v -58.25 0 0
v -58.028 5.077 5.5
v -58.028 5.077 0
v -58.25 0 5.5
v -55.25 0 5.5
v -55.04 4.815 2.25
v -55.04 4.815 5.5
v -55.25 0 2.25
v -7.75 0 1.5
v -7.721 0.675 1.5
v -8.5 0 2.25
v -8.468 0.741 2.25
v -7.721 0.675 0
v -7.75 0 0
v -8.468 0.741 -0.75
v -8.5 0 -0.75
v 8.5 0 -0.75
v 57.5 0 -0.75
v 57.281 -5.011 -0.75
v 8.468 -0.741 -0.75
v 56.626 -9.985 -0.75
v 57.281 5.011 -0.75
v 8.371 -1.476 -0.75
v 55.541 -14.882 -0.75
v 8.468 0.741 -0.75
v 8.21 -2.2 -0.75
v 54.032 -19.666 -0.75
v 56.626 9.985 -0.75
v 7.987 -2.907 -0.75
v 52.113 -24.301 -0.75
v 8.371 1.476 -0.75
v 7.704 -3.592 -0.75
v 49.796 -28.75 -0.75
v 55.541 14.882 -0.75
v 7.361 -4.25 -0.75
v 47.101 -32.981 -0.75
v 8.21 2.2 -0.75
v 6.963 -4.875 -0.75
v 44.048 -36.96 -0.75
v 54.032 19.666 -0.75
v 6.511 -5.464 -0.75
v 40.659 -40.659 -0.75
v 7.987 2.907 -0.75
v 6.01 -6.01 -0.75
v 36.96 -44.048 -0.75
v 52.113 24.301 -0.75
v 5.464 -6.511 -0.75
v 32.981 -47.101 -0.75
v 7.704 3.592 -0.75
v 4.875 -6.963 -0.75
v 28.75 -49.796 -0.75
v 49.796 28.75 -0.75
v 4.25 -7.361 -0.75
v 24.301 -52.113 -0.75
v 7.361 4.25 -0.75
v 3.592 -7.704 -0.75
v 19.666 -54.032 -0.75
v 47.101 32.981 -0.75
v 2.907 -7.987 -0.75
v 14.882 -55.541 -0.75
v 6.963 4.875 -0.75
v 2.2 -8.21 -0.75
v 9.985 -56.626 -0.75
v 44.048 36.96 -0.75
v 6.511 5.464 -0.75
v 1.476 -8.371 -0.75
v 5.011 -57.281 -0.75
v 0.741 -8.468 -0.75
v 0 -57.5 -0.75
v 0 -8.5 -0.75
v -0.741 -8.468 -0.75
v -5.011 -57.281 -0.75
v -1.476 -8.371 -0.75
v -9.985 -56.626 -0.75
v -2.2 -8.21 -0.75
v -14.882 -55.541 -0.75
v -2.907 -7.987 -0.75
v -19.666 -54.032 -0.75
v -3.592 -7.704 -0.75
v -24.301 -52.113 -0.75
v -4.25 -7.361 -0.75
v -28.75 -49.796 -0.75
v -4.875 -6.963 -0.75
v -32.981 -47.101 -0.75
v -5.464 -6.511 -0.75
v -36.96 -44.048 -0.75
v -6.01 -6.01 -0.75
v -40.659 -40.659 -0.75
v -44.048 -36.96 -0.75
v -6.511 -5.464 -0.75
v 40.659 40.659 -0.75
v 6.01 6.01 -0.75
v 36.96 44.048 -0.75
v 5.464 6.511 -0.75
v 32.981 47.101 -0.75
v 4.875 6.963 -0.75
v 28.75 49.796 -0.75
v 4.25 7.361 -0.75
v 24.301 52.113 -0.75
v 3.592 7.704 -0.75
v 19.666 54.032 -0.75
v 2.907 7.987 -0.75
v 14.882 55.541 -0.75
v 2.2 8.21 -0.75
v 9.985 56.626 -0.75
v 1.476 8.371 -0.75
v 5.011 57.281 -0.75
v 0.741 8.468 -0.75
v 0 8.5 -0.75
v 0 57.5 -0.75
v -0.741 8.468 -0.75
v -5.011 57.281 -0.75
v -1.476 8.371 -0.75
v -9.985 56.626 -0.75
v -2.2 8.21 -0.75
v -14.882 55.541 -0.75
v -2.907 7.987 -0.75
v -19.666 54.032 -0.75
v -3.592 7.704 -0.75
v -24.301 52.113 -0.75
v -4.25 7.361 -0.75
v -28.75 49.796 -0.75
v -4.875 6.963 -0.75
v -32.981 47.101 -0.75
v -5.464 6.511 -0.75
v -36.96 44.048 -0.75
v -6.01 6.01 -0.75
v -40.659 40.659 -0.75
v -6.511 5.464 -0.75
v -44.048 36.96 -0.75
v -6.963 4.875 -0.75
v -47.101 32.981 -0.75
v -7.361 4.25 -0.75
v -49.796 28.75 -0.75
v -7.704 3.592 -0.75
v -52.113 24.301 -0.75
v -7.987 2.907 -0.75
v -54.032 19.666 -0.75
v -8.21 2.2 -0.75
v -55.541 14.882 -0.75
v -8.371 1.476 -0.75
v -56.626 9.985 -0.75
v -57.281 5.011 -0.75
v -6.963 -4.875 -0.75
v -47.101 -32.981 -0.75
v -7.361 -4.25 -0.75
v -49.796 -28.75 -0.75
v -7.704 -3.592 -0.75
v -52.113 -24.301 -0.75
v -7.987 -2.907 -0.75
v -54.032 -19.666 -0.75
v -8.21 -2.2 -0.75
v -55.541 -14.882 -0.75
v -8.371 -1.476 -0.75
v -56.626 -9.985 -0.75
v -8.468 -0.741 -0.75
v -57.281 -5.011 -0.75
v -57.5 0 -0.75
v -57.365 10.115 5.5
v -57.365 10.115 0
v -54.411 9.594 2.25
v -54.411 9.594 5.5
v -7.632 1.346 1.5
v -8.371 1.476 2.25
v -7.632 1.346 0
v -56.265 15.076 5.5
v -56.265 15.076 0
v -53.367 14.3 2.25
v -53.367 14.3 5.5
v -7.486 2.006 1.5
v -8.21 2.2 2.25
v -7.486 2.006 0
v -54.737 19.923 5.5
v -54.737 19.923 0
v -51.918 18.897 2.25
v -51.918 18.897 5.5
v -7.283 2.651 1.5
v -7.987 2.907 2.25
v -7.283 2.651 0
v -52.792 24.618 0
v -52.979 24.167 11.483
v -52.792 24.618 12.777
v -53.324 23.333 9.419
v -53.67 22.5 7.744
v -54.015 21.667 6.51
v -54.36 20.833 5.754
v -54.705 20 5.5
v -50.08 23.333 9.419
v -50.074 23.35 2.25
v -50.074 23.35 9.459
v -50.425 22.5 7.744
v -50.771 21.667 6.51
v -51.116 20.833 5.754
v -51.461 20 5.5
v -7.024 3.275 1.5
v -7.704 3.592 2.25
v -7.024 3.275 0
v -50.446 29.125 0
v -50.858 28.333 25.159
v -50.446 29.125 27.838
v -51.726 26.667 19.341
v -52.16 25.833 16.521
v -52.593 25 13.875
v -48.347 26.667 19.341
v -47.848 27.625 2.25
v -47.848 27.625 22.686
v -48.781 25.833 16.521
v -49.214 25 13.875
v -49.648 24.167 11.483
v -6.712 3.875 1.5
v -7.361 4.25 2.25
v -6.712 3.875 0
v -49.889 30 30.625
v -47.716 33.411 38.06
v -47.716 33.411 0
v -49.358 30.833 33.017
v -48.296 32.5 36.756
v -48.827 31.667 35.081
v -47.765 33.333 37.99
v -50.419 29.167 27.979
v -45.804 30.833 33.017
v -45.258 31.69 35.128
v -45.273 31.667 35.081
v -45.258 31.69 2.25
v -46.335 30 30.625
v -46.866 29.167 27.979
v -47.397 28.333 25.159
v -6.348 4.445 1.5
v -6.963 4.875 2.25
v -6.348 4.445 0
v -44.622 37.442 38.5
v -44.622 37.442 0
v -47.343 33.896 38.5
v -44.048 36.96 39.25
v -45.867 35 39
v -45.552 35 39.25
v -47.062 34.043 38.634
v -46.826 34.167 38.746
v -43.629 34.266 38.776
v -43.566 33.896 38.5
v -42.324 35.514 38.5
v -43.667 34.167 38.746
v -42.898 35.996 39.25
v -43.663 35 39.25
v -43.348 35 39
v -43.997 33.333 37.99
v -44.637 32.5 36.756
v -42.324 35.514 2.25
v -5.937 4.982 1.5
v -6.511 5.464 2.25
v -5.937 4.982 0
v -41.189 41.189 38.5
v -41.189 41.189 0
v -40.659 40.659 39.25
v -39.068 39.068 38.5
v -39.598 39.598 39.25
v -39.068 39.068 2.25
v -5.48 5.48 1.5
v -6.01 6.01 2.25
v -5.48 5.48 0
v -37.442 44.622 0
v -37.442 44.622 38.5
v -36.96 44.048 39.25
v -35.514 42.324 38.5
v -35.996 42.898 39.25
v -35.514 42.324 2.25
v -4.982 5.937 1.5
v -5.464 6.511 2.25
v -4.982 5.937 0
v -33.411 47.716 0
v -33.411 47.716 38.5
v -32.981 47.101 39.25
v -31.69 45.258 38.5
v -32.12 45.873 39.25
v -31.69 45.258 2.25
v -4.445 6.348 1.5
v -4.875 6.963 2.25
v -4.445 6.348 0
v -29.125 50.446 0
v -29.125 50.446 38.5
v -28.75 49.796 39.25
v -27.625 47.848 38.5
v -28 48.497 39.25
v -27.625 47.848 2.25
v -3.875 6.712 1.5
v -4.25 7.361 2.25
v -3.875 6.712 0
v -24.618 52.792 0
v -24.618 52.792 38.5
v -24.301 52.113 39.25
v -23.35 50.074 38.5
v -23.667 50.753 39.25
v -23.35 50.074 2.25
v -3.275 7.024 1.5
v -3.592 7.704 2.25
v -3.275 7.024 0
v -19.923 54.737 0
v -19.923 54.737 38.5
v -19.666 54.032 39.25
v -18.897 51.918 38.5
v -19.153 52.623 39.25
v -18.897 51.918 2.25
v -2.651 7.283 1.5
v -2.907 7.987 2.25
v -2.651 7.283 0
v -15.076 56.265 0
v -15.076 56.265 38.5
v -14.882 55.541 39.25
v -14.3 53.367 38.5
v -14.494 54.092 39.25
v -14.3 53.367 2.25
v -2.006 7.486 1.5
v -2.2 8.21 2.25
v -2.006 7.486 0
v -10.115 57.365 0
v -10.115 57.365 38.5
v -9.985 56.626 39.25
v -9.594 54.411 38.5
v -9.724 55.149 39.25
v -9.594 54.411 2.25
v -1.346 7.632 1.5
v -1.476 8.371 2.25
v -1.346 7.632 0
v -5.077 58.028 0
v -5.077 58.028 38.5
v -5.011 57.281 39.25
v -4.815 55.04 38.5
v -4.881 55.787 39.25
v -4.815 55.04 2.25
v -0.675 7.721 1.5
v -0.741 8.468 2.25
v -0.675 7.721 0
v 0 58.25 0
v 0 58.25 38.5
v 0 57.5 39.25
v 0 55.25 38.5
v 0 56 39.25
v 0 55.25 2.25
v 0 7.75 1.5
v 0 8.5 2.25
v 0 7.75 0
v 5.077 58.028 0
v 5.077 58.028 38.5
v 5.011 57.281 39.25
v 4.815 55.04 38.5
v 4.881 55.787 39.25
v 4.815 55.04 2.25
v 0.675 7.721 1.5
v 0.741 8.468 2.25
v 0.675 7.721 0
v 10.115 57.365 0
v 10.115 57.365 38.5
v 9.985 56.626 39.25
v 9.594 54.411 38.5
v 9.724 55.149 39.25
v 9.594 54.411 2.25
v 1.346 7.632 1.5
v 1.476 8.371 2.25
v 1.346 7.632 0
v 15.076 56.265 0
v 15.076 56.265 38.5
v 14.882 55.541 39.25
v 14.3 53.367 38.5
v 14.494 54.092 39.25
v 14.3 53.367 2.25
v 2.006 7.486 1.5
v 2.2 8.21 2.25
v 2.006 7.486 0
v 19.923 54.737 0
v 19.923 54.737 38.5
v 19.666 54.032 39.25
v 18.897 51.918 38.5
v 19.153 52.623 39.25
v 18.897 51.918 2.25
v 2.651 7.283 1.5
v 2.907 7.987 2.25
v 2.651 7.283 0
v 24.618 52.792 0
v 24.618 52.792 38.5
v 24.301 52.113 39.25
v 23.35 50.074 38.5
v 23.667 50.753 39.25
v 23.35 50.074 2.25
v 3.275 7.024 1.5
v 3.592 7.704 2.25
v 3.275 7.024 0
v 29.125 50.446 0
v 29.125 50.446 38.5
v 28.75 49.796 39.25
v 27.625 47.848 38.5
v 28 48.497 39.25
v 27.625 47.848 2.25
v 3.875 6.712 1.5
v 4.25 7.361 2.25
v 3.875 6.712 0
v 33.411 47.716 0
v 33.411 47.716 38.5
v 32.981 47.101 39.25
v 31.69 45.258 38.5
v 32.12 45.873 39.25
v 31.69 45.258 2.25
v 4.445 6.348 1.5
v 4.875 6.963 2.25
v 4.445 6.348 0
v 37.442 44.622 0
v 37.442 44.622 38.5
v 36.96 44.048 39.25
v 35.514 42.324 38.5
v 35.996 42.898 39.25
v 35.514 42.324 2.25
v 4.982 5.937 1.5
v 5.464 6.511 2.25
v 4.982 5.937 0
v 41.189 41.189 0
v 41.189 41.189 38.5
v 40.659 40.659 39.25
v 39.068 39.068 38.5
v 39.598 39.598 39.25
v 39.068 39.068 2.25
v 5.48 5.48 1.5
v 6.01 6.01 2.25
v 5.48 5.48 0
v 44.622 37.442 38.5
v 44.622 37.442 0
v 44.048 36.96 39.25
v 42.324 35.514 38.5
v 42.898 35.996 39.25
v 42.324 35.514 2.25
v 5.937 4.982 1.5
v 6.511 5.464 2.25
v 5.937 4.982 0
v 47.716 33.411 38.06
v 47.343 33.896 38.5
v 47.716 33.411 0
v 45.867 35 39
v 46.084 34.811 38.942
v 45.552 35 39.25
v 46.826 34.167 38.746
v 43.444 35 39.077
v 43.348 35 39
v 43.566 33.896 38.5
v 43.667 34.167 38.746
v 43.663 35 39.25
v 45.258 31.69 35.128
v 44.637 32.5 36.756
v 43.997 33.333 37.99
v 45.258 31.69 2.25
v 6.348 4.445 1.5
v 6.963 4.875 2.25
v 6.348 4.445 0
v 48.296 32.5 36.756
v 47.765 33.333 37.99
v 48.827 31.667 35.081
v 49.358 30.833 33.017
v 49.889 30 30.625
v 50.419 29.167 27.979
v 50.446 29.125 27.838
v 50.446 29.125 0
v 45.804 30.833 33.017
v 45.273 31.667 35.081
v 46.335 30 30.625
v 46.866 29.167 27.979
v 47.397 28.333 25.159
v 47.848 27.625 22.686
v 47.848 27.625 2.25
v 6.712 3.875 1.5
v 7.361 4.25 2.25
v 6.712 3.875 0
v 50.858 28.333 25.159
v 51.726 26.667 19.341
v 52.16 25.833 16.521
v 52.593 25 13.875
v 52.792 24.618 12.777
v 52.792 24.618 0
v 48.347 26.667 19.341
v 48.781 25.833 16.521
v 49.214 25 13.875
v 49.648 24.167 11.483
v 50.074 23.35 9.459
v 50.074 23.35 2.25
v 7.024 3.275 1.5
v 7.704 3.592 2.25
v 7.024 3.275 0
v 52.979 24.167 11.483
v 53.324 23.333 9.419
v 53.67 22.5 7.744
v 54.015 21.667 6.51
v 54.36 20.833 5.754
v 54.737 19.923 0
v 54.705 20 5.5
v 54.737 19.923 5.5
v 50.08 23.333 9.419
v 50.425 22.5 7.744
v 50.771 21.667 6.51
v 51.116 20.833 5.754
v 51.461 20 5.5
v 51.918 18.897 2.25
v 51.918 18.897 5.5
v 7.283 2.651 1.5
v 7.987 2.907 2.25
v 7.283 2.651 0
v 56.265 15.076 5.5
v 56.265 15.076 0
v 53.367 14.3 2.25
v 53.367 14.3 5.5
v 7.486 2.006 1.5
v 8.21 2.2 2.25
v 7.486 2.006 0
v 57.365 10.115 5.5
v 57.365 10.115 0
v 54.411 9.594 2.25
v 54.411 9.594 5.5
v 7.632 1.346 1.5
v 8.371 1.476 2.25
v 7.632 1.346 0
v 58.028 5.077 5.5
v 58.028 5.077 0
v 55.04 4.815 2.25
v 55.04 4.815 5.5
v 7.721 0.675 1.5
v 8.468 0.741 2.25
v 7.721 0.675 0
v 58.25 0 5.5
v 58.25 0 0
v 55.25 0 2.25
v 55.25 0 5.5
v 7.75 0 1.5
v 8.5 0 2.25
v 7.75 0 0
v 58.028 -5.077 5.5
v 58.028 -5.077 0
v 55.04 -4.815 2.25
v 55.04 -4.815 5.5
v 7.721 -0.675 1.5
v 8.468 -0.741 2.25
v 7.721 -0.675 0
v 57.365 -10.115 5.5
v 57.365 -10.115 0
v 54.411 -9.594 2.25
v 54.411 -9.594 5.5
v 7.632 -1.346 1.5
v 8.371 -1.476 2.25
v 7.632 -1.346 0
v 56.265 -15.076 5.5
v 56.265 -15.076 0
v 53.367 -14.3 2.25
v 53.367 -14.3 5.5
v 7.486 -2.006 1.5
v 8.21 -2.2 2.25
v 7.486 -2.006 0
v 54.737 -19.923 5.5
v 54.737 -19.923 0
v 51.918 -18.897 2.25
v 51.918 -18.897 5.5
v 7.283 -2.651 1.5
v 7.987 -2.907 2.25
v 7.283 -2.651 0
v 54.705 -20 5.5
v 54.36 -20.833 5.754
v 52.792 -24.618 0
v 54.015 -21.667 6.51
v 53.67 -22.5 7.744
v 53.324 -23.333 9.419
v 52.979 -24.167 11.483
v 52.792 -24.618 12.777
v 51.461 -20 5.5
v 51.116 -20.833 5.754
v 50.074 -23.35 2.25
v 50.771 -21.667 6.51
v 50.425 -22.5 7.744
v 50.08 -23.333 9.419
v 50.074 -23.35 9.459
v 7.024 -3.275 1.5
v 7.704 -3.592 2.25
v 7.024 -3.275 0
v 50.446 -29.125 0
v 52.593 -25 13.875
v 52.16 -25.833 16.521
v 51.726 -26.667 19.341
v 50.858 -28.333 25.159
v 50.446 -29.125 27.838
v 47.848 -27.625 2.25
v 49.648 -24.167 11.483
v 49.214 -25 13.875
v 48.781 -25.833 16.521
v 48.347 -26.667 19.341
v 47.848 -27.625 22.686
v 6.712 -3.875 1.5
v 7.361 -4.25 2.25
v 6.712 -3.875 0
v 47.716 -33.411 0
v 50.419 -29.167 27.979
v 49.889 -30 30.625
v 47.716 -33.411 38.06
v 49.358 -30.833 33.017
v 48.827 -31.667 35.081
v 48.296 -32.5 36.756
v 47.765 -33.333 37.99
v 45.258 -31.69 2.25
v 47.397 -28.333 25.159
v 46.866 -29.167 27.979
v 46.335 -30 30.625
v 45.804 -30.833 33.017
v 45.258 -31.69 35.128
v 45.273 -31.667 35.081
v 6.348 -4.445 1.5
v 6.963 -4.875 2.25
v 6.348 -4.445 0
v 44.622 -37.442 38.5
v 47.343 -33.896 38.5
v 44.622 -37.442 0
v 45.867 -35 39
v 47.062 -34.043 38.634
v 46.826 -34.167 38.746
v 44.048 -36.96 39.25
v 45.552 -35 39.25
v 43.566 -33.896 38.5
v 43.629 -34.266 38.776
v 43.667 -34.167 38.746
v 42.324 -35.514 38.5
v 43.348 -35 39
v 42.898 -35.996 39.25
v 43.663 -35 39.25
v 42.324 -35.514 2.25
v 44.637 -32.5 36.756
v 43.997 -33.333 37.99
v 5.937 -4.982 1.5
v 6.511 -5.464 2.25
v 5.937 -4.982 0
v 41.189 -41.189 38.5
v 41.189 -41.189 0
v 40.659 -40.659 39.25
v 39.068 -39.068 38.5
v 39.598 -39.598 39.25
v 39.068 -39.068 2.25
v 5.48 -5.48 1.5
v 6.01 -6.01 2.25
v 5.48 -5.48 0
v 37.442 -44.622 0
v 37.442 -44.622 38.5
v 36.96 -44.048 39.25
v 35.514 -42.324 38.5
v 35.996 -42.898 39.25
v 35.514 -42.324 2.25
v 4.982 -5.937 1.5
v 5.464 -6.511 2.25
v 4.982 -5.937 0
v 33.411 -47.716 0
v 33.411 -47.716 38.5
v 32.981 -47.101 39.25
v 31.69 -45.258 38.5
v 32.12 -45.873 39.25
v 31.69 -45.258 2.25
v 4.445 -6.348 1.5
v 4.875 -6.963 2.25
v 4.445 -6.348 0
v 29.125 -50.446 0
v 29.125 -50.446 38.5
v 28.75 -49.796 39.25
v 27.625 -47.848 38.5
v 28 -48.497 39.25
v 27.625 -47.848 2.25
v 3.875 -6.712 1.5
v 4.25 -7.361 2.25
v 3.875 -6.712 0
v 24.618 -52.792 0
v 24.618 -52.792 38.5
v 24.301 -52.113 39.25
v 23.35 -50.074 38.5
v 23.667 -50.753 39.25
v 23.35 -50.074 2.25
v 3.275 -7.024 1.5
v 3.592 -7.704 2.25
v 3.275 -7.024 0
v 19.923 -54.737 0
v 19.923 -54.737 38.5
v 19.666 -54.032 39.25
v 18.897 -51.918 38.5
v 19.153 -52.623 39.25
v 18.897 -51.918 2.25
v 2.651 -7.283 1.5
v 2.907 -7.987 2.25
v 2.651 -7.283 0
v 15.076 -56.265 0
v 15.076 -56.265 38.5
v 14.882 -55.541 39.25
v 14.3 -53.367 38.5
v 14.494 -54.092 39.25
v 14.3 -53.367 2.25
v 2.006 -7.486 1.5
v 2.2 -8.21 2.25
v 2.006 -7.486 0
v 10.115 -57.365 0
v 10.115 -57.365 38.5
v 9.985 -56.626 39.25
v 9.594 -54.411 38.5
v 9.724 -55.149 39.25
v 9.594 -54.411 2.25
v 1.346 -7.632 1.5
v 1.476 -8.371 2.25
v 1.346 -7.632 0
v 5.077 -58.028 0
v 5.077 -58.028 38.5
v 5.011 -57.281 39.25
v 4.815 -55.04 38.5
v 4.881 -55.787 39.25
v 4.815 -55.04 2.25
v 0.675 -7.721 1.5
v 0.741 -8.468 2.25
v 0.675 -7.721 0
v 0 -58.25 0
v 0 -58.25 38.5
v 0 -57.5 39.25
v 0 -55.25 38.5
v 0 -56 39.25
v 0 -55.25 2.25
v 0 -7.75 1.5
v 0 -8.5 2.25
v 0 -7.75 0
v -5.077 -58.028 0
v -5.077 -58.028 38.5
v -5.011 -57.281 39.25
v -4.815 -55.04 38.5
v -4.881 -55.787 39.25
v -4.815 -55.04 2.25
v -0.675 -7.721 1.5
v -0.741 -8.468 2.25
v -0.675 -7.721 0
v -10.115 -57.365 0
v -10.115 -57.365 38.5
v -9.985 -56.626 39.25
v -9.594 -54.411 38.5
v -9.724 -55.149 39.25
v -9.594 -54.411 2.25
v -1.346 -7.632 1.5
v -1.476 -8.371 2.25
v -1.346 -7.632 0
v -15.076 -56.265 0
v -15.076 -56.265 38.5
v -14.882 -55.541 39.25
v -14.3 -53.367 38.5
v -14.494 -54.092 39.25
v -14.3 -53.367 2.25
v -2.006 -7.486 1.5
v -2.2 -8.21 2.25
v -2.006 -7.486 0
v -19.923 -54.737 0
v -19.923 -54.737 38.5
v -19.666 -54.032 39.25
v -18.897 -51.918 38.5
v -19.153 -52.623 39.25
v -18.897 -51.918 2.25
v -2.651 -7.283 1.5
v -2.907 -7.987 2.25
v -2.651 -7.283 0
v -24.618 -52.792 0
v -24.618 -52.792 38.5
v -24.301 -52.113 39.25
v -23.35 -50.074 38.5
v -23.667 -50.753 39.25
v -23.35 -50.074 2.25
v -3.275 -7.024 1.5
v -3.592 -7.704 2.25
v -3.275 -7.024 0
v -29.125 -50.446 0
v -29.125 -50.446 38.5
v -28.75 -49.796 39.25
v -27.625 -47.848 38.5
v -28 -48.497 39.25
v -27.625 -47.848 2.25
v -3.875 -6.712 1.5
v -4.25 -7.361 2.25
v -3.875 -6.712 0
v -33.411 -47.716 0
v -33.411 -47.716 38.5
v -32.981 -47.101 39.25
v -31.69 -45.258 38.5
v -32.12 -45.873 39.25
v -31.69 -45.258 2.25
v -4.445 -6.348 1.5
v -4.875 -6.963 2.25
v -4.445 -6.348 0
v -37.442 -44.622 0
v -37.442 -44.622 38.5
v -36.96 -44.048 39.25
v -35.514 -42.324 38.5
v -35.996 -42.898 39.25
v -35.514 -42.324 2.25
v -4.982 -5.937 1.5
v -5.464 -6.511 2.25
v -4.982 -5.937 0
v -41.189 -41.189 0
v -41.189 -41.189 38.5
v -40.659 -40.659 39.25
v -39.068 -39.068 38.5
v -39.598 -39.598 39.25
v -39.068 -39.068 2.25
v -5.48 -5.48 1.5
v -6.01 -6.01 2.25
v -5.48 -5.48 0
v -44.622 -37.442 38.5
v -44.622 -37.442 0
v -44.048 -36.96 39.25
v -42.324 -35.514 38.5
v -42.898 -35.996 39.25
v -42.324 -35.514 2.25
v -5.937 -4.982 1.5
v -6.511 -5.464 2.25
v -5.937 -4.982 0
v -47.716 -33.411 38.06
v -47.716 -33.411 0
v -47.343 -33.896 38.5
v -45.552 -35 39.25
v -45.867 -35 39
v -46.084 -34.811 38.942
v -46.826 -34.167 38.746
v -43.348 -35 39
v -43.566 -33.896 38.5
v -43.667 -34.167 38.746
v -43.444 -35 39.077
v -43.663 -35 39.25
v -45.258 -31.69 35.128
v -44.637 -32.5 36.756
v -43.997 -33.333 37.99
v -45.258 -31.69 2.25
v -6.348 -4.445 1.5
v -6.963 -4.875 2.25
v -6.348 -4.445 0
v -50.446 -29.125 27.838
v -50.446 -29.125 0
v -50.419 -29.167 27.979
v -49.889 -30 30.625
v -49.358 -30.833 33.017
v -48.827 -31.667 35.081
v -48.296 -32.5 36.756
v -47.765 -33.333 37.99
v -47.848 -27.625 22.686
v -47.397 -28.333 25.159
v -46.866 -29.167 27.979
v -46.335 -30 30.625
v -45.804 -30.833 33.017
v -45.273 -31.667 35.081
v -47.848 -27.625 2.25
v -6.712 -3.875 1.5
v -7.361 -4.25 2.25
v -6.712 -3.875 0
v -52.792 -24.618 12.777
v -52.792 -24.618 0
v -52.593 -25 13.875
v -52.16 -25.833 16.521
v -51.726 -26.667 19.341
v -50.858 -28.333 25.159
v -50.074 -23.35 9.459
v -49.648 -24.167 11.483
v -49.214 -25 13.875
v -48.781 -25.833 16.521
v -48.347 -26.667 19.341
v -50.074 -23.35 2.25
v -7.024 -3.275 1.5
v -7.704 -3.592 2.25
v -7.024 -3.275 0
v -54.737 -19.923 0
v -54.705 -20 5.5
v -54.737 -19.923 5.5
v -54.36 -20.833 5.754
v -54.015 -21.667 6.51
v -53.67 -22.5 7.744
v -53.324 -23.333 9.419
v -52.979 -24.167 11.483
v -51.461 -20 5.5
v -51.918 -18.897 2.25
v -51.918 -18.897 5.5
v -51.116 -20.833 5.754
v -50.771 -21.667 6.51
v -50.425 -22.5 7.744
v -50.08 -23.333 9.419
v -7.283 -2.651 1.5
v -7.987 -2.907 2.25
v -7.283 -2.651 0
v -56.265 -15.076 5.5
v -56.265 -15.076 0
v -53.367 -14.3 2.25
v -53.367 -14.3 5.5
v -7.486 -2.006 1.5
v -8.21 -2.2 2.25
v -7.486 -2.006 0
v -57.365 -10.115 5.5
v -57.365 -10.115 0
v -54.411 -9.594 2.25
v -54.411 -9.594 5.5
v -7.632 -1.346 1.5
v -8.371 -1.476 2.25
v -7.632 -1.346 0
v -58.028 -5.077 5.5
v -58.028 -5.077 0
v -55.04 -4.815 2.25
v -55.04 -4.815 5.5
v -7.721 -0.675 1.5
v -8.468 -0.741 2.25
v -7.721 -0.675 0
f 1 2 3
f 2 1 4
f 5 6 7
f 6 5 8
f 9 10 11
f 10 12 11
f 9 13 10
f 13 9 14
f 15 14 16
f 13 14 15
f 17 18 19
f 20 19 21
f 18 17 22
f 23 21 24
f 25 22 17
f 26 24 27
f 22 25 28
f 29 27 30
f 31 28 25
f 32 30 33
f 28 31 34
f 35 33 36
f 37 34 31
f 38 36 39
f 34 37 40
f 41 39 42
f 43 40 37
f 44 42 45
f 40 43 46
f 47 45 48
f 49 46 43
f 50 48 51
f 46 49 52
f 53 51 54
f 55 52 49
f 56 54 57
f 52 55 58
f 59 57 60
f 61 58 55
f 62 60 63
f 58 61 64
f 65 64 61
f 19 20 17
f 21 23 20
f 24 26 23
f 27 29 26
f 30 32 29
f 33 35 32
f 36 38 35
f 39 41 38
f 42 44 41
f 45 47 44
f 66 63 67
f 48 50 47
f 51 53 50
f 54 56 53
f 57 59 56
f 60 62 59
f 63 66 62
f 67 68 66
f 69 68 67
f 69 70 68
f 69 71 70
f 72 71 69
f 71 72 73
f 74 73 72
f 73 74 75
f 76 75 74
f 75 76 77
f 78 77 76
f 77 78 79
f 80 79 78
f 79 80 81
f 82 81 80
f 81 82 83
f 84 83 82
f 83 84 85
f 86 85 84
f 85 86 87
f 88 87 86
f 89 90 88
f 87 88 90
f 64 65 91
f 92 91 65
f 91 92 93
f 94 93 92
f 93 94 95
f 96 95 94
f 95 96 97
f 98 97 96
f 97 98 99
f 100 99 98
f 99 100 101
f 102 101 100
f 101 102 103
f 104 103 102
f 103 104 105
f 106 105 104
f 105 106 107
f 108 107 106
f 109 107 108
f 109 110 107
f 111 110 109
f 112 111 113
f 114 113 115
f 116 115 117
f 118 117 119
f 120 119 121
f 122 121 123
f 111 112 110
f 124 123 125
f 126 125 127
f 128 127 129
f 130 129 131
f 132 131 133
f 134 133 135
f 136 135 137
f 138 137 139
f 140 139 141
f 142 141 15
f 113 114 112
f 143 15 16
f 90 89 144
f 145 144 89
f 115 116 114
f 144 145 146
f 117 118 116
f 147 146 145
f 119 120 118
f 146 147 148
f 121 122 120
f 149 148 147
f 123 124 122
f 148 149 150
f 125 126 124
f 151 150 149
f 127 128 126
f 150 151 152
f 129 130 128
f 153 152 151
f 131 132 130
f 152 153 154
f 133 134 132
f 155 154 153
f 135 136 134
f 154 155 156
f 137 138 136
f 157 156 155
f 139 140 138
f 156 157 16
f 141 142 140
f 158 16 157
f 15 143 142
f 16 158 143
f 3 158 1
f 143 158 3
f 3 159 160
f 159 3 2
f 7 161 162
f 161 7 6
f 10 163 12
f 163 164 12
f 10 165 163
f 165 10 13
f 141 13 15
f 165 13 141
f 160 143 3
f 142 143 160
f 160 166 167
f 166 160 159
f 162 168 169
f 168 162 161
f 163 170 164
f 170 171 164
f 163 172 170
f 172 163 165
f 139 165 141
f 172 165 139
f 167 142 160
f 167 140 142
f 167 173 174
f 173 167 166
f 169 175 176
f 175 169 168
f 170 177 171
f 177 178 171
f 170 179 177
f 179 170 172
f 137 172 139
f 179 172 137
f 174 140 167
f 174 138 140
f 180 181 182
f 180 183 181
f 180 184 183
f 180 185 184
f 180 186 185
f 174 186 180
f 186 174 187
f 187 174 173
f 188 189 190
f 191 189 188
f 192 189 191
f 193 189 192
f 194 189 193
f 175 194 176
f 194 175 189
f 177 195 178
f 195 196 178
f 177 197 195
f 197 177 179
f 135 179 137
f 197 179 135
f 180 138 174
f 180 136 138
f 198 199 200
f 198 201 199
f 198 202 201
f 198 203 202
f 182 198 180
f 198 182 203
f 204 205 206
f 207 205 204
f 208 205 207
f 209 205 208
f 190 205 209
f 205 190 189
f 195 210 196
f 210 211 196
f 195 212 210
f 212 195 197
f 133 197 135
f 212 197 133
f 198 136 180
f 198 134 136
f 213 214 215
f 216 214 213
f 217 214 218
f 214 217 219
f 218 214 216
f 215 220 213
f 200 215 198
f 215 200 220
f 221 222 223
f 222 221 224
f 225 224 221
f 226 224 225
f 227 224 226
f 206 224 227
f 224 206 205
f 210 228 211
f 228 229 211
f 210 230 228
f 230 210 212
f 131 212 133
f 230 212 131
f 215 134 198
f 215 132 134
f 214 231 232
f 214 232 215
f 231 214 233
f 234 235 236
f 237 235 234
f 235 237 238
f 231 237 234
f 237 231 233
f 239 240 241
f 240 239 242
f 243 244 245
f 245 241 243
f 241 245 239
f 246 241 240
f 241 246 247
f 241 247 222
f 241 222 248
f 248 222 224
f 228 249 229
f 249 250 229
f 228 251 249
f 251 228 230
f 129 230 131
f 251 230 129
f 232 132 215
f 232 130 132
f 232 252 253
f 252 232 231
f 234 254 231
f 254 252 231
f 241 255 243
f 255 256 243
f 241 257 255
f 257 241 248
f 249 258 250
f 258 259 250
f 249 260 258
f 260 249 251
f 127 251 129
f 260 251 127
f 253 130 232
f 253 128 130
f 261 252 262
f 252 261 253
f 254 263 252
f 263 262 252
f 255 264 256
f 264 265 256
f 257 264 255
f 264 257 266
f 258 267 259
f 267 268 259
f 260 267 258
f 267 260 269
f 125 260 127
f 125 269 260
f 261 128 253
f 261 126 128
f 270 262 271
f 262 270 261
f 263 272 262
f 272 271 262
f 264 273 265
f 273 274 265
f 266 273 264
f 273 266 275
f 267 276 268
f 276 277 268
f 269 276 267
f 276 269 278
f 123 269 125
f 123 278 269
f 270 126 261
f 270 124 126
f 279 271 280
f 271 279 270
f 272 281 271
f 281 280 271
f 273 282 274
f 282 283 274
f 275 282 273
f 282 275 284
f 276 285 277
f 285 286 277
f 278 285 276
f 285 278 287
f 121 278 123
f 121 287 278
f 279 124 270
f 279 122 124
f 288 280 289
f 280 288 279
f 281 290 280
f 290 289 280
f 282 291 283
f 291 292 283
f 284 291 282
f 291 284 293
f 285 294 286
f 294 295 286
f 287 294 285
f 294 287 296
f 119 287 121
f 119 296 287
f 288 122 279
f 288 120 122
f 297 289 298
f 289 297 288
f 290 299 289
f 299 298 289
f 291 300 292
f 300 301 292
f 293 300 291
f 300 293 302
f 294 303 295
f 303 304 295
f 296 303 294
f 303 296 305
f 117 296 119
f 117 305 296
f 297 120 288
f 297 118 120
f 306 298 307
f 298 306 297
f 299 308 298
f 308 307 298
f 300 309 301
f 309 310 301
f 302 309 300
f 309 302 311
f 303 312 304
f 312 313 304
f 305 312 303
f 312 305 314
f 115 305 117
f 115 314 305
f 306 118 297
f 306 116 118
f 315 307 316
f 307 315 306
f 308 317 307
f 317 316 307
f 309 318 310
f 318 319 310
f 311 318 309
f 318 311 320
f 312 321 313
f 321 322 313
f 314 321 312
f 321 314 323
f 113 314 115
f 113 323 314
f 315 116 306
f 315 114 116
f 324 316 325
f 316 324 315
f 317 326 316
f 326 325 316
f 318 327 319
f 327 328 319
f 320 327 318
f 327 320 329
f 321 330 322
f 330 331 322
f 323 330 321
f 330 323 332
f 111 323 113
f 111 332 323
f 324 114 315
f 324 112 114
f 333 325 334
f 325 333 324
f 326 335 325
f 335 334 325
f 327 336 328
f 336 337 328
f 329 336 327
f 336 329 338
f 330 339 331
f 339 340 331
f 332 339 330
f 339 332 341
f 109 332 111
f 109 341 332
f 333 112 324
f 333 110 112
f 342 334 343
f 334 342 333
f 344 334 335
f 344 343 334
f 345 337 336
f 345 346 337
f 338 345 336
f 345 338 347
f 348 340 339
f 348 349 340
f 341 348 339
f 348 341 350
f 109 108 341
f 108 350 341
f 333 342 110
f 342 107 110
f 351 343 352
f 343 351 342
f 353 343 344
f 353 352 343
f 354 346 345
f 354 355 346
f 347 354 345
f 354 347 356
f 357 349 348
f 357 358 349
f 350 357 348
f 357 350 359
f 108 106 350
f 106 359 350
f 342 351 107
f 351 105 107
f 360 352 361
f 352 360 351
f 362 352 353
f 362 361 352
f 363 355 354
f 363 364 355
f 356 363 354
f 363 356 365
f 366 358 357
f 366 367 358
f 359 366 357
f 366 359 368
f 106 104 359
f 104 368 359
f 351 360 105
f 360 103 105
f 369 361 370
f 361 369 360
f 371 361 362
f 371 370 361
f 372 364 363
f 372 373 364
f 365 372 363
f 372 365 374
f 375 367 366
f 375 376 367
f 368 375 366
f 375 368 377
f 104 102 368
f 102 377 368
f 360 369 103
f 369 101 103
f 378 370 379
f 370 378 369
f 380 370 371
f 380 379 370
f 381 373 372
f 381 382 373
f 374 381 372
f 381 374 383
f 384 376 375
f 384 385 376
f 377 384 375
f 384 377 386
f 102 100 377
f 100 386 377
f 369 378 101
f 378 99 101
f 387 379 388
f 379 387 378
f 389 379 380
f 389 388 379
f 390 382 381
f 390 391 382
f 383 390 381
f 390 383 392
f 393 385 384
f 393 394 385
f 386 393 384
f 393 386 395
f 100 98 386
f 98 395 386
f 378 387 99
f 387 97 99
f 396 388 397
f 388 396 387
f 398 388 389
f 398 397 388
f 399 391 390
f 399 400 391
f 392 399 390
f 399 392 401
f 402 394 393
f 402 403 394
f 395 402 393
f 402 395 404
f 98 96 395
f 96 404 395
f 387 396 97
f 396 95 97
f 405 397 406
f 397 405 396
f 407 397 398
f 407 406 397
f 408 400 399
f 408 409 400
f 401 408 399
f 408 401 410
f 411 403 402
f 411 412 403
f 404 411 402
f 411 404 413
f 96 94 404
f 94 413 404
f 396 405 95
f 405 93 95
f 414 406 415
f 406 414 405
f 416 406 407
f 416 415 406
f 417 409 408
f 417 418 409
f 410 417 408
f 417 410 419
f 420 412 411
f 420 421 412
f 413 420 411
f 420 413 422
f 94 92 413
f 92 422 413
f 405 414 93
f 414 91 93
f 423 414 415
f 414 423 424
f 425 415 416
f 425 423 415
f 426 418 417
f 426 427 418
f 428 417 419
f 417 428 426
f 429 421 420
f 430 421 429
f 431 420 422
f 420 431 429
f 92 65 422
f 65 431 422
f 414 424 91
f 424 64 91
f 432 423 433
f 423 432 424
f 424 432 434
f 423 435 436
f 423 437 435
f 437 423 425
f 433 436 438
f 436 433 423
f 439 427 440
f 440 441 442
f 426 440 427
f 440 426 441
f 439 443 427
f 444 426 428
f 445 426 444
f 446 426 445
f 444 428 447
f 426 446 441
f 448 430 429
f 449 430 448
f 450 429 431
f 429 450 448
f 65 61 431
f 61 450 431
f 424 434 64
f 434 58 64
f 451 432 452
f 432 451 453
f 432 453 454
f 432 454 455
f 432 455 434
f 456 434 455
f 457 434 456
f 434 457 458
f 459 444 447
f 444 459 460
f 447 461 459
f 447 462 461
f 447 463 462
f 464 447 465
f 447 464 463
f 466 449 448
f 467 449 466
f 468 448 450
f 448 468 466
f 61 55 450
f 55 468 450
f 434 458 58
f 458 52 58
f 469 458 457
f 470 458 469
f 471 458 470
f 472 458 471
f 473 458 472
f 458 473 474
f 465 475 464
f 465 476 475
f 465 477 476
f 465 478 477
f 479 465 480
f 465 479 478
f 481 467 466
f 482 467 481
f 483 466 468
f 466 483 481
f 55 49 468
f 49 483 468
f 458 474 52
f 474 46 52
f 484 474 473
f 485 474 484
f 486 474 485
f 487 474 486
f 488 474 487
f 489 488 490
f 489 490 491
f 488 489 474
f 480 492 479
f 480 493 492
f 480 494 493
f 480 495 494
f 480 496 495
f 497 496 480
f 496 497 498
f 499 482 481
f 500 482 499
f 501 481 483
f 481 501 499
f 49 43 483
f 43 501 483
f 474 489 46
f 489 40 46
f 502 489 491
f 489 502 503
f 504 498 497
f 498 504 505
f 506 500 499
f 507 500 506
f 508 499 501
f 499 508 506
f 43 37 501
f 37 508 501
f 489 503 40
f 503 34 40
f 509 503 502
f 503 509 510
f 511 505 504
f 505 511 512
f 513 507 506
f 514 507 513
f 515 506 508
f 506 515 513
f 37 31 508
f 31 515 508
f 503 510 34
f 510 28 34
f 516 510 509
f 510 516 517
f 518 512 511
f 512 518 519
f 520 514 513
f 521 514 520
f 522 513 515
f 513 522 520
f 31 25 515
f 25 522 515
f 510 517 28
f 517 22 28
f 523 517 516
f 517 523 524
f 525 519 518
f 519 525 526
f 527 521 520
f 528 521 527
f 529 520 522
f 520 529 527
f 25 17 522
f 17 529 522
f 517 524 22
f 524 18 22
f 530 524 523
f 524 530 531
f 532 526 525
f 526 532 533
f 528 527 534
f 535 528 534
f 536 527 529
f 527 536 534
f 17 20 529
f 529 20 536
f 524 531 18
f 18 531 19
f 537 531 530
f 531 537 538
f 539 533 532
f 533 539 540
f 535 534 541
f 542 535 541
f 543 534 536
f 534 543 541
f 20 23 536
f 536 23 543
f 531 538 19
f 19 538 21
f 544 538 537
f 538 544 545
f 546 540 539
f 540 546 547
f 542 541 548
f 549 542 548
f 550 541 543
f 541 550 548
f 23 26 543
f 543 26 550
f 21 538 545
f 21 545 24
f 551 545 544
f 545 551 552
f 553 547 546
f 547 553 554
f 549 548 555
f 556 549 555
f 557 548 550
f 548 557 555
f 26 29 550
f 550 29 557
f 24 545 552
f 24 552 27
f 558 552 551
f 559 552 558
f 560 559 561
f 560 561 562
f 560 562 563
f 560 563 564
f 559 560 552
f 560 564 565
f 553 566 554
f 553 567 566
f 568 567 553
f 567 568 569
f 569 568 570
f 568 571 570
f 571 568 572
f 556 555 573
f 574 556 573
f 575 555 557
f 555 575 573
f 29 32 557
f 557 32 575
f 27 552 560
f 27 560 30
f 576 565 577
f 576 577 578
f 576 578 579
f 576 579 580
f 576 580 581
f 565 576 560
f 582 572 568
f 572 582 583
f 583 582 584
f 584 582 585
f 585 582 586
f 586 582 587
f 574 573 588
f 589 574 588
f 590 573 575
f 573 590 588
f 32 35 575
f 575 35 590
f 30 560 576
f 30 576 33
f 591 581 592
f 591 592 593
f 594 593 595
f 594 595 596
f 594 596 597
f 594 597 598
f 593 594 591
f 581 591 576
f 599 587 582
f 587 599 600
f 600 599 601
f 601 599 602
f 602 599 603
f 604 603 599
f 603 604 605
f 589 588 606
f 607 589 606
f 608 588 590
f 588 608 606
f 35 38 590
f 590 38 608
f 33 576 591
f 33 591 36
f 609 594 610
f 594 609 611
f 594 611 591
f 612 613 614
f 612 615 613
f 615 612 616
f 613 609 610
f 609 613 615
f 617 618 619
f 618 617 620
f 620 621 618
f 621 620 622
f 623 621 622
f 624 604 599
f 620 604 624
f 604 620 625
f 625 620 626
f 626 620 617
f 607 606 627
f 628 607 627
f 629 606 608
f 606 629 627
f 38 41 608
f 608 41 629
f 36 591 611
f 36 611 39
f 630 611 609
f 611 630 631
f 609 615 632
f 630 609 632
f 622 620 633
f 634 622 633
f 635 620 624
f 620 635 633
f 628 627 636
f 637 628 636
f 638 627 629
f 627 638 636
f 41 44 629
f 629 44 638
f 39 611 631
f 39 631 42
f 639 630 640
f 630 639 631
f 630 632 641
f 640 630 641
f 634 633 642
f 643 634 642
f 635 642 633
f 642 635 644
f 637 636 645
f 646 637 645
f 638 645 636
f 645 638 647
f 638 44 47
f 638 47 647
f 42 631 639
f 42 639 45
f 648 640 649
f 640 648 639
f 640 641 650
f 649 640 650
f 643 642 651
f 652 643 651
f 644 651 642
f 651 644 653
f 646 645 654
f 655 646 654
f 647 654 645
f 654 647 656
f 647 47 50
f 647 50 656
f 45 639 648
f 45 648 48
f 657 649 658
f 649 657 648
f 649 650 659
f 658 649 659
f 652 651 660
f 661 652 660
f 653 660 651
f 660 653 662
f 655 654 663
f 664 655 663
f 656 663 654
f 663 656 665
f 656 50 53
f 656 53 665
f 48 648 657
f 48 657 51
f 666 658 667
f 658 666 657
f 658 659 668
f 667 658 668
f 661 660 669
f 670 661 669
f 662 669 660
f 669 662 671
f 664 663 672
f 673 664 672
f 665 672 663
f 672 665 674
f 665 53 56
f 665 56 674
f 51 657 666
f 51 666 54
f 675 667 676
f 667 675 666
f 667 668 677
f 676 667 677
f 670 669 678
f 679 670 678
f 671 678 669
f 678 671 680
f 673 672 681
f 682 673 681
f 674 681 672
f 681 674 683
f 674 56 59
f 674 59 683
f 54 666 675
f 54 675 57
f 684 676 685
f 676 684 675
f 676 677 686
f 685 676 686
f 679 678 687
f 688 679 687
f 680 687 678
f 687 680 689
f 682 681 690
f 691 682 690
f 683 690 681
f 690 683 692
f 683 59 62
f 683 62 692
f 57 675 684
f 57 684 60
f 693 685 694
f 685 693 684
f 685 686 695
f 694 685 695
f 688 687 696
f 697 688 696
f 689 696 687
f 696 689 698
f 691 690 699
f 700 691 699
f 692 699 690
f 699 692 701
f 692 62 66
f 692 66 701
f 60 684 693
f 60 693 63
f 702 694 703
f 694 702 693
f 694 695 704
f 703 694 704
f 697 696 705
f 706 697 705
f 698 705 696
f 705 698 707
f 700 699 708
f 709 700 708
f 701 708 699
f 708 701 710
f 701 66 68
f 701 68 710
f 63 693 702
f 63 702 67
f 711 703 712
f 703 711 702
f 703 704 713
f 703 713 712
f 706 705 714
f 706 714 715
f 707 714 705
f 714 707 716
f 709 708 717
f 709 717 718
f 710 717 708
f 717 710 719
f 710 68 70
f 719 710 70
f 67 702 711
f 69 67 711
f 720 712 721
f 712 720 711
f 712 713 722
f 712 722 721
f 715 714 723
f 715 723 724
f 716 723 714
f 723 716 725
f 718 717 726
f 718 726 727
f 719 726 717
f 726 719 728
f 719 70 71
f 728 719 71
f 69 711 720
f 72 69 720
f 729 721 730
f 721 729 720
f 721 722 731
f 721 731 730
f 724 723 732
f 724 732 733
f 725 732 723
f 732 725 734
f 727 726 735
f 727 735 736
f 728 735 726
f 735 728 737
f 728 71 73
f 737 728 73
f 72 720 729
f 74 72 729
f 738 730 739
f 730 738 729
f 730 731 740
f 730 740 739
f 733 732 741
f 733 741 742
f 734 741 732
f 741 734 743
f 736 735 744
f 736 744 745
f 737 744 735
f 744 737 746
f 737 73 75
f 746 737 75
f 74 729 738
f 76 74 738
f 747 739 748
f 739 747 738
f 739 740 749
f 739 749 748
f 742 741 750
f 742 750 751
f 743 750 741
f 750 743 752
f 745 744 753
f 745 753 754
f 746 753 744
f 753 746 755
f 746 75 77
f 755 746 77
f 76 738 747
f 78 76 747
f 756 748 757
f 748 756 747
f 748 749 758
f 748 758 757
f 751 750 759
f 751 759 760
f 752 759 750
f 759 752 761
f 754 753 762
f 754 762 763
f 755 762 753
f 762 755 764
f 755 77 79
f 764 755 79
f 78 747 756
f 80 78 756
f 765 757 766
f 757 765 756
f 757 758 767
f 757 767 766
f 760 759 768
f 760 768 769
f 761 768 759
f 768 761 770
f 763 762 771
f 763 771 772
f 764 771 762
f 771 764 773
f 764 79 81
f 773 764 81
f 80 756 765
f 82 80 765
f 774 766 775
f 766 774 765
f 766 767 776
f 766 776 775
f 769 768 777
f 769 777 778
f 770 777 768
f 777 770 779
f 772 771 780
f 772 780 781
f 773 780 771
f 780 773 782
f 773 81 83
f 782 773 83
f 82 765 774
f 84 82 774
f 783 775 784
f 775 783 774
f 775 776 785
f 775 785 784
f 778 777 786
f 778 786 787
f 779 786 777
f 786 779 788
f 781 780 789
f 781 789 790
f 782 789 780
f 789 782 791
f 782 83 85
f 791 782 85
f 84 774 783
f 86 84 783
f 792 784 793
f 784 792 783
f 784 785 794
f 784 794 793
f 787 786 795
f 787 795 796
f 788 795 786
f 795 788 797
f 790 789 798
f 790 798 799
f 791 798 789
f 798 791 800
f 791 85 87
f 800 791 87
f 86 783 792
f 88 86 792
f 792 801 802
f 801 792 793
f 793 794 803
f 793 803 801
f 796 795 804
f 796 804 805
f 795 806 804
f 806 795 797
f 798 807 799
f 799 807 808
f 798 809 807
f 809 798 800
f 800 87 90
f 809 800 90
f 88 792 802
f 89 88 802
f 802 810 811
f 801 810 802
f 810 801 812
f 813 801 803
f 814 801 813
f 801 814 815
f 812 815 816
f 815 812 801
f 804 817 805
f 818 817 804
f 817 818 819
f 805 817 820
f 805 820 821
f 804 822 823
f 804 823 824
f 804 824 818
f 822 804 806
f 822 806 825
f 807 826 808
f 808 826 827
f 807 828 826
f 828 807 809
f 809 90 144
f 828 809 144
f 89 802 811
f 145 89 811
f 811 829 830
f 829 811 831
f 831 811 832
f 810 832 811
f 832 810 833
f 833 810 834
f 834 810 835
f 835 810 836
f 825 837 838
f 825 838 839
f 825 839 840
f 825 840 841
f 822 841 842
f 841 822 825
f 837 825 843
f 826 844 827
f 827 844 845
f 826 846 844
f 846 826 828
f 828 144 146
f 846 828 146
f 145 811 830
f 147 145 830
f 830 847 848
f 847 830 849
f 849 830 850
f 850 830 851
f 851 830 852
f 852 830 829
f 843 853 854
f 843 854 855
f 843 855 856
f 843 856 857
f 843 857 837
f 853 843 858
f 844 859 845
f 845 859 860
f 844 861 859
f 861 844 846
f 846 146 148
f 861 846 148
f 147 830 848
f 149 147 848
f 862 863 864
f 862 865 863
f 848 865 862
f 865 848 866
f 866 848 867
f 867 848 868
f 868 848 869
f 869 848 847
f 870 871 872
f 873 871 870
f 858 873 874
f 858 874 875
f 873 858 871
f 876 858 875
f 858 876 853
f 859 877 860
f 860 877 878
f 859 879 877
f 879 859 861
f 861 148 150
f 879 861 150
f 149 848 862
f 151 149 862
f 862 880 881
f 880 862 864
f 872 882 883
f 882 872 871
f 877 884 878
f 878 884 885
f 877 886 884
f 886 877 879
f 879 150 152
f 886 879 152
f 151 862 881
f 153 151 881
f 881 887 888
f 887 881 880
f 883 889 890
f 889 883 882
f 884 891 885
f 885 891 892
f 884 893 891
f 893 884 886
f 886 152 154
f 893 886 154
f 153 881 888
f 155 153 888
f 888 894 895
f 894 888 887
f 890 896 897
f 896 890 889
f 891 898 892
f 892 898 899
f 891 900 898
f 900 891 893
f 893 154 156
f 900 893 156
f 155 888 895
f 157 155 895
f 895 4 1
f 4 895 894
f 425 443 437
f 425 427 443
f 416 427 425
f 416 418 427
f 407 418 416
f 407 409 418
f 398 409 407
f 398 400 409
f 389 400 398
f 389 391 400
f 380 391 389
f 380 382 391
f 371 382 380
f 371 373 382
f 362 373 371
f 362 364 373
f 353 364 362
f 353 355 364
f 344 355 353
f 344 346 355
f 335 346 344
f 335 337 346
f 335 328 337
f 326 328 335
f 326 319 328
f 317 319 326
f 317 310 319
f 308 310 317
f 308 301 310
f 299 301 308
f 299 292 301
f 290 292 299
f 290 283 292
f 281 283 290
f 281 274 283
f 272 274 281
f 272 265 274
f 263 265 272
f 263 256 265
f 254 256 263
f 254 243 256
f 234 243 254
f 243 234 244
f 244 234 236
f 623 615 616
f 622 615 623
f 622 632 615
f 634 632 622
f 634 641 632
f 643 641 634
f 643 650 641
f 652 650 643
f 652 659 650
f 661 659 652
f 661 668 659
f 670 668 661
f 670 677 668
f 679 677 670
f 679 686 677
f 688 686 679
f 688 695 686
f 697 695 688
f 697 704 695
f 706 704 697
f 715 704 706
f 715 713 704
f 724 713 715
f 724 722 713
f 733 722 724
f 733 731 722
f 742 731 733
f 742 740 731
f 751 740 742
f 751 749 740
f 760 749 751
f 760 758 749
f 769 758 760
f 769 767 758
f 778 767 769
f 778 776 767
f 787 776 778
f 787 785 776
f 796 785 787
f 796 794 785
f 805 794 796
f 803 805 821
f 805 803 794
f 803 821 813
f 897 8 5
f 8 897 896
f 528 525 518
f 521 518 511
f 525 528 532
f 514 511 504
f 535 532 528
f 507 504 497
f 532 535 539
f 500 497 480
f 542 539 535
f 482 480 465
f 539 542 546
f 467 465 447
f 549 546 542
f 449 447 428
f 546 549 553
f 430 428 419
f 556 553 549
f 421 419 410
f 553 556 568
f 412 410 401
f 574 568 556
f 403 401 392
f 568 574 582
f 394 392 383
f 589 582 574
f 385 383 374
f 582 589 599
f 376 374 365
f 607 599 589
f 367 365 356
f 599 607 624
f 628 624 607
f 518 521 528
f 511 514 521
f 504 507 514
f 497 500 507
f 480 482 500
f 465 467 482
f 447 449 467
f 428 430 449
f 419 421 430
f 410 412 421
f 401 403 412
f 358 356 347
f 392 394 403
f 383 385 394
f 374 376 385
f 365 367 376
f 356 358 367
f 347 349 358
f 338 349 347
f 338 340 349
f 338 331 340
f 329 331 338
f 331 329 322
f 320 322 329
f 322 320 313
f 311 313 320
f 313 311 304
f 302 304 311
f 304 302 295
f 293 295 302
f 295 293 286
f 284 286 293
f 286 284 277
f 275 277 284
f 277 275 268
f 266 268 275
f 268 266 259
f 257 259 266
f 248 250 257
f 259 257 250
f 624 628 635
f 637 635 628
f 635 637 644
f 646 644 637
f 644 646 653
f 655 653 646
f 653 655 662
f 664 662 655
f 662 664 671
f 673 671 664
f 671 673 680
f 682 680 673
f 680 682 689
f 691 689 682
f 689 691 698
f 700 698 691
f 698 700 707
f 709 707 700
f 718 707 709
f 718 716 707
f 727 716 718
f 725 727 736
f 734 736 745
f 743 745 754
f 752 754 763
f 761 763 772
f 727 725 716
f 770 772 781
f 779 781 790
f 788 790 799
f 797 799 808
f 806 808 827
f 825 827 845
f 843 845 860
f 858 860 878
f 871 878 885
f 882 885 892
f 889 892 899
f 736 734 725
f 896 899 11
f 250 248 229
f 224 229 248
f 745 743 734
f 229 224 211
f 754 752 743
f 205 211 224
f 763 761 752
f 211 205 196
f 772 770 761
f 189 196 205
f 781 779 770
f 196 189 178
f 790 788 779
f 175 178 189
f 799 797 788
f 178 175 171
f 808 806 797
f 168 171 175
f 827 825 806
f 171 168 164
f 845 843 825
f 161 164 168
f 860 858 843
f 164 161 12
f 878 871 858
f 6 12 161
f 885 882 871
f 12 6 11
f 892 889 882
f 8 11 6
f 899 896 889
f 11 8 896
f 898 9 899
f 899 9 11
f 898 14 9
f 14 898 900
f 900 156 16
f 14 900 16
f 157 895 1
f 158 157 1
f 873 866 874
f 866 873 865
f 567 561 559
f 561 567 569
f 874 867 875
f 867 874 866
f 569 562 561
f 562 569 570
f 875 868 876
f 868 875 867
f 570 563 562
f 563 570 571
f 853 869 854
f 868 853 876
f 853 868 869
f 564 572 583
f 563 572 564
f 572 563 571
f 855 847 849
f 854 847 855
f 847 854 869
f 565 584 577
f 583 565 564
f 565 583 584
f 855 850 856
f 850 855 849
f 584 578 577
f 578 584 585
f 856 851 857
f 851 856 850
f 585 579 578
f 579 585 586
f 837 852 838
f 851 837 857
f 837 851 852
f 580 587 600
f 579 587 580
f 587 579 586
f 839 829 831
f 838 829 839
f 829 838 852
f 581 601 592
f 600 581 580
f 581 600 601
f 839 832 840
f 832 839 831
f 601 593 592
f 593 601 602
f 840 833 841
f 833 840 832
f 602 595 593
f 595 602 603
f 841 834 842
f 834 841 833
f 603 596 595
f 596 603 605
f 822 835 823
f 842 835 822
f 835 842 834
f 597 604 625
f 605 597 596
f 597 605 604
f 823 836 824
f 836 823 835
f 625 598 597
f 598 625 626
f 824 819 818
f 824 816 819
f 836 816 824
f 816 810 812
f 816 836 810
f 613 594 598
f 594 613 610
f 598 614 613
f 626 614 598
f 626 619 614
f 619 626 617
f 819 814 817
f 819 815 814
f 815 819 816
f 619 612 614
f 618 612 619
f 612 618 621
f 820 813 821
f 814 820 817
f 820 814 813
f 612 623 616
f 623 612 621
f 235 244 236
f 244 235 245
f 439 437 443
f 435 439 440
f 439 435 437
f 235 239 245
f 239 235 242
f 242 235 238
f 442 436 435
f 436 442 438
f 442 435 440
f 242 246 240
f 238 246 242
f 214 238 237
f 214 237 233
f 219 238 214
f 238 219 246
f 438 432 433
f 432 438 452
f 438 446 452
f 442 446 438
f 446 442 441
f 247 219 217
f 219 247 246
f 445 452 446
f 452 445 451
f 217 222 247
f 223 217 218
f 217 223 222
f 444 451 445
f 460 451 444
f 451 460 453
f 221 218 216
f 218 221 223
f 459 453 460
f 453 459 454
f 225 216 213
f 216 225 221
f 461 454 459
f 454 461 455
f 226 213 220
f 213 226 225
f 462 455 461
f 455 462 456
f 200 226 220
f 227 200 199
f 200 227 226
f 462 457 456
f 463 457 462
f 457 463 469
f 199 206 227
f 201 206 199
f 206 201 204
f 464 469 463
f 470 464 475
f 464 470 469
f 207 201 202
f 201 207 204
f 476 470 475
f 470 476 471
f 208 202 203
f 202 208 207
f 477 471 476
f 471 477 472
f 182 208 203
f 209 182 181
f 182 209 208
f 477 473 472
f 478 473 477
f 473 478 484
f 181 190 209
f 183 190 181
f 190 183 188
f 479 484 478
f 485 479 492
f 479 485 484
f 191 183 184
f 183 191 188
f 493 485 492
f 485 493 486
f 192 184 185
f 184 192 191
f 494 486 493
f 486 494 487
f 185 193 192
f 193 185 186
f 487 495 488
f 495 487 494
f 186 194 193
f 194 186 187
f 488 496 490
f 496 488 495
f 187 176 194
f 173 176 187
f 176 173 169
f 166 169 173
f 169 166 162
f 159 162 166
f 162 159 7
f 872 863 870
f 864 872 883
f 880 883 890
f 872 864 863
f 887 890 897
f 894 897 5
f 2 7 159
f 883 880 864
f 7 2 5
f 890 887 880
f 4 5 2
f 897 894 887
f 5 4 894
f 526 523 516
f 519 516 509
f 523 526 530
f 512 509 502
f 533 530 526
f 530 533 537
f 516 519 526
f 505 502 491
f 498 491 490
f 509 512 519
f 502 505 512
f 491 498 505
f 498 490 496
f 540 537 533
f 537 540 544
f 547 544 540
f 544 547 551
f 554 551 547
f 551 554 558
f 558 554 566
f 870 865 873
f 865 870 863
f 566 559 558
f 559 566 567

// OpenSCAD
$fa = 5;
innerDiameter = 112;
innerHeight = 37;
wallThickness = 1.5;
fingerHoleDiameter = 17;
cutoutLower = 40;
cutoutUpper = 70;
cutoutBottom = 4;

module basicHolder() {
    rotate_extrude()
        offset(r=wallThickness/2)
            polygon(points=[[fingerHoleDiameter/2,0],
                [innerDiameter/2+wallThickness,0],
                [innerDiameter/2+wallThickness,innerHeight+wallThickness],
                [innerDiameter/2,innerHeight+wallThickness],
                [innerDiameter/2,wallThickness],
                [fingerHoleDiameter/2,wallThickness]]);
}

module cutoutHalf() {
    cutoutPointsOld=[[cutoutBottom,0],
        [cutoutBottom,cutoutLower/2],
        [innerHeight+wallThickness,cutoutUpper/2],
        [innerHeight+wallThickness,0]];
    cutoutPoints=[[cutoutBottom,0],
// Using Excel to generate the sine wave shape
[4,20],
[4.254470137,20.83333333],
[5.010148602,21.66666667],
[6.244074487,22.5],
[7.918755578,23.33333333],
[9.983307538,24.16666667],
[12.375,25],
[15.0211626,25.83333333],
[17.84139302,26.66666667],
[20.75,27.5],
[23.65860698,28.33333333],
[26.4788374,29.16666667],
[29.125,30],
[31.51669246,30.83333333],
[33.58124442,31.66666667],
[35.25592551,32.5],
[36.4898514,33.33333333],
[37.24552986,34.16666667],
[37.5,35],
[innerHeight+wallThickness,cutoutUpper/2],
[innerHeight+wallThickness,0]];
   
    polygon(cutoutPoints);
}

module cutout() {
    linear_extrude(innerDiameter*2) {
        cutoutHalf();
        mirror([0,180,0])
            cutoutHalf();
    }
}

difference() {
    basicHolder();
    translate([innerDiameter,0,wallThickness])
        rotate([0,-90,0])
            cutout();
}
